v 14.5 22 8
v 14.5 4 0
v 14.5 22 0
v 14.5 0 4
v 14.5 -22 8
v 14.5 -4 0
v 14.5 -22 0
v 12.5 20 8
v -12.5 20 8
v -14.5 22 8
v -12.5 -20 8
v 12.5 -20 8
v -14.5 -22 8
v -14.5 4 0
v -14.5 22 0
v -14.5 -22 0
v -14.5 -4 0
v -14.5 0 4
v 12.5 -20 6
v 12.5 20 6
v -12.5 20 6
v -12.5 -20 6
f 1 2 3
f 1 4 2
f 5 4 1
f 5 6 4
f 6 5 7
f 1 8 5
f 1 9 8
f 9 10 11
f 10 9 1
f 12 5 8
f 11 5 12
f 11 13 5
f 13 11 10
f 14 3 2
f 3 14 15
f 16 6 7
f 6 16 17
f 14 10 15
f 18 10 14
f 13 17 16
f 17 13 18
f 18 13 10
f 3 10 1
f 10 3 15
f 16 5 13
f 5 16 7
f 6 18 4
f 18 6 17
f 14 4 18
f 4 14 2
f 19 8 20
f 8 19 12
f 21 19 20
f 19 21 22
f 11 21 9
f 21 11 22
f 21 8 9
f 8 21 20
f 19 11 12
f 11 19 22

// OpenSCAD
/*
 * Bar Clamp Rod Adapter (Parametric), v0.42
 *
 * by Alex Franke (CodeCreations), Jan 2013
 * http://www.theFrankes.com
 * 
 * Licenced under Creative Commons Attribution - Non-Commercial - Share Alike 3.0 
 * 
 * DESCRIPTION: This adapter makes it eacy to clamp rods down to a flat surface with 
 *   a bar clamp.  
 * 
 * INSTRUCTIONS: Choose some values in the "User-defined values" section if 
 *   necessary, render, and print. Print with several walls and higher infill for 
 *   added strength.  
 * 
 * v0.42, Jan 23, 2013: Initial Release.
 * 
 * TODO: 
 *   * None at this time
 */

/////////////////////////////////////////////////////////////////////////////
// User-defined values... 
/////////////////////////////////////////////////////////////////////////////

// The length of the clamp jaw
jawLength = 40; 

// The width of the clamp jaw 
jawWidth = 25; 

// The thickness of the lip surrounding the clamp jaw
lipThickness = 2; 

// The height of the lip surrounding the clamp jaw
lipHeight = 2; 

// The depth of the groove 
grooveDepth = 4; 

// The minimum thickness of the adapter (at the top of the groove) 
minimumThickness = 2;


/////////////////////////////////////////////////////////////////////////////
// The code... 
/////////////////////////////////////////////////////////////////////////////
totalSize = [jawWidth+lipThickness*2,jawLength+lipThickness*2,grooveDepth+minimumThickness+lipHeight];

difference() {
	translate([0,0,totalSize[2]/2]) 
		cube(totalSize, center=true);

	translate([-(totalSize[0]+1)/2,0,grooveDepth]) 
		rotate([-135,0,0]) 
			cube([totalSize[0]+1,grooveDepth*2,grooveDepth*2]);

	translate([0,0,(lipHeight+1)/2+grooveDepth+minimumThickness]) 
		cube([jawWidth,jawLength,lipHeight+1], center=true);

}
	
